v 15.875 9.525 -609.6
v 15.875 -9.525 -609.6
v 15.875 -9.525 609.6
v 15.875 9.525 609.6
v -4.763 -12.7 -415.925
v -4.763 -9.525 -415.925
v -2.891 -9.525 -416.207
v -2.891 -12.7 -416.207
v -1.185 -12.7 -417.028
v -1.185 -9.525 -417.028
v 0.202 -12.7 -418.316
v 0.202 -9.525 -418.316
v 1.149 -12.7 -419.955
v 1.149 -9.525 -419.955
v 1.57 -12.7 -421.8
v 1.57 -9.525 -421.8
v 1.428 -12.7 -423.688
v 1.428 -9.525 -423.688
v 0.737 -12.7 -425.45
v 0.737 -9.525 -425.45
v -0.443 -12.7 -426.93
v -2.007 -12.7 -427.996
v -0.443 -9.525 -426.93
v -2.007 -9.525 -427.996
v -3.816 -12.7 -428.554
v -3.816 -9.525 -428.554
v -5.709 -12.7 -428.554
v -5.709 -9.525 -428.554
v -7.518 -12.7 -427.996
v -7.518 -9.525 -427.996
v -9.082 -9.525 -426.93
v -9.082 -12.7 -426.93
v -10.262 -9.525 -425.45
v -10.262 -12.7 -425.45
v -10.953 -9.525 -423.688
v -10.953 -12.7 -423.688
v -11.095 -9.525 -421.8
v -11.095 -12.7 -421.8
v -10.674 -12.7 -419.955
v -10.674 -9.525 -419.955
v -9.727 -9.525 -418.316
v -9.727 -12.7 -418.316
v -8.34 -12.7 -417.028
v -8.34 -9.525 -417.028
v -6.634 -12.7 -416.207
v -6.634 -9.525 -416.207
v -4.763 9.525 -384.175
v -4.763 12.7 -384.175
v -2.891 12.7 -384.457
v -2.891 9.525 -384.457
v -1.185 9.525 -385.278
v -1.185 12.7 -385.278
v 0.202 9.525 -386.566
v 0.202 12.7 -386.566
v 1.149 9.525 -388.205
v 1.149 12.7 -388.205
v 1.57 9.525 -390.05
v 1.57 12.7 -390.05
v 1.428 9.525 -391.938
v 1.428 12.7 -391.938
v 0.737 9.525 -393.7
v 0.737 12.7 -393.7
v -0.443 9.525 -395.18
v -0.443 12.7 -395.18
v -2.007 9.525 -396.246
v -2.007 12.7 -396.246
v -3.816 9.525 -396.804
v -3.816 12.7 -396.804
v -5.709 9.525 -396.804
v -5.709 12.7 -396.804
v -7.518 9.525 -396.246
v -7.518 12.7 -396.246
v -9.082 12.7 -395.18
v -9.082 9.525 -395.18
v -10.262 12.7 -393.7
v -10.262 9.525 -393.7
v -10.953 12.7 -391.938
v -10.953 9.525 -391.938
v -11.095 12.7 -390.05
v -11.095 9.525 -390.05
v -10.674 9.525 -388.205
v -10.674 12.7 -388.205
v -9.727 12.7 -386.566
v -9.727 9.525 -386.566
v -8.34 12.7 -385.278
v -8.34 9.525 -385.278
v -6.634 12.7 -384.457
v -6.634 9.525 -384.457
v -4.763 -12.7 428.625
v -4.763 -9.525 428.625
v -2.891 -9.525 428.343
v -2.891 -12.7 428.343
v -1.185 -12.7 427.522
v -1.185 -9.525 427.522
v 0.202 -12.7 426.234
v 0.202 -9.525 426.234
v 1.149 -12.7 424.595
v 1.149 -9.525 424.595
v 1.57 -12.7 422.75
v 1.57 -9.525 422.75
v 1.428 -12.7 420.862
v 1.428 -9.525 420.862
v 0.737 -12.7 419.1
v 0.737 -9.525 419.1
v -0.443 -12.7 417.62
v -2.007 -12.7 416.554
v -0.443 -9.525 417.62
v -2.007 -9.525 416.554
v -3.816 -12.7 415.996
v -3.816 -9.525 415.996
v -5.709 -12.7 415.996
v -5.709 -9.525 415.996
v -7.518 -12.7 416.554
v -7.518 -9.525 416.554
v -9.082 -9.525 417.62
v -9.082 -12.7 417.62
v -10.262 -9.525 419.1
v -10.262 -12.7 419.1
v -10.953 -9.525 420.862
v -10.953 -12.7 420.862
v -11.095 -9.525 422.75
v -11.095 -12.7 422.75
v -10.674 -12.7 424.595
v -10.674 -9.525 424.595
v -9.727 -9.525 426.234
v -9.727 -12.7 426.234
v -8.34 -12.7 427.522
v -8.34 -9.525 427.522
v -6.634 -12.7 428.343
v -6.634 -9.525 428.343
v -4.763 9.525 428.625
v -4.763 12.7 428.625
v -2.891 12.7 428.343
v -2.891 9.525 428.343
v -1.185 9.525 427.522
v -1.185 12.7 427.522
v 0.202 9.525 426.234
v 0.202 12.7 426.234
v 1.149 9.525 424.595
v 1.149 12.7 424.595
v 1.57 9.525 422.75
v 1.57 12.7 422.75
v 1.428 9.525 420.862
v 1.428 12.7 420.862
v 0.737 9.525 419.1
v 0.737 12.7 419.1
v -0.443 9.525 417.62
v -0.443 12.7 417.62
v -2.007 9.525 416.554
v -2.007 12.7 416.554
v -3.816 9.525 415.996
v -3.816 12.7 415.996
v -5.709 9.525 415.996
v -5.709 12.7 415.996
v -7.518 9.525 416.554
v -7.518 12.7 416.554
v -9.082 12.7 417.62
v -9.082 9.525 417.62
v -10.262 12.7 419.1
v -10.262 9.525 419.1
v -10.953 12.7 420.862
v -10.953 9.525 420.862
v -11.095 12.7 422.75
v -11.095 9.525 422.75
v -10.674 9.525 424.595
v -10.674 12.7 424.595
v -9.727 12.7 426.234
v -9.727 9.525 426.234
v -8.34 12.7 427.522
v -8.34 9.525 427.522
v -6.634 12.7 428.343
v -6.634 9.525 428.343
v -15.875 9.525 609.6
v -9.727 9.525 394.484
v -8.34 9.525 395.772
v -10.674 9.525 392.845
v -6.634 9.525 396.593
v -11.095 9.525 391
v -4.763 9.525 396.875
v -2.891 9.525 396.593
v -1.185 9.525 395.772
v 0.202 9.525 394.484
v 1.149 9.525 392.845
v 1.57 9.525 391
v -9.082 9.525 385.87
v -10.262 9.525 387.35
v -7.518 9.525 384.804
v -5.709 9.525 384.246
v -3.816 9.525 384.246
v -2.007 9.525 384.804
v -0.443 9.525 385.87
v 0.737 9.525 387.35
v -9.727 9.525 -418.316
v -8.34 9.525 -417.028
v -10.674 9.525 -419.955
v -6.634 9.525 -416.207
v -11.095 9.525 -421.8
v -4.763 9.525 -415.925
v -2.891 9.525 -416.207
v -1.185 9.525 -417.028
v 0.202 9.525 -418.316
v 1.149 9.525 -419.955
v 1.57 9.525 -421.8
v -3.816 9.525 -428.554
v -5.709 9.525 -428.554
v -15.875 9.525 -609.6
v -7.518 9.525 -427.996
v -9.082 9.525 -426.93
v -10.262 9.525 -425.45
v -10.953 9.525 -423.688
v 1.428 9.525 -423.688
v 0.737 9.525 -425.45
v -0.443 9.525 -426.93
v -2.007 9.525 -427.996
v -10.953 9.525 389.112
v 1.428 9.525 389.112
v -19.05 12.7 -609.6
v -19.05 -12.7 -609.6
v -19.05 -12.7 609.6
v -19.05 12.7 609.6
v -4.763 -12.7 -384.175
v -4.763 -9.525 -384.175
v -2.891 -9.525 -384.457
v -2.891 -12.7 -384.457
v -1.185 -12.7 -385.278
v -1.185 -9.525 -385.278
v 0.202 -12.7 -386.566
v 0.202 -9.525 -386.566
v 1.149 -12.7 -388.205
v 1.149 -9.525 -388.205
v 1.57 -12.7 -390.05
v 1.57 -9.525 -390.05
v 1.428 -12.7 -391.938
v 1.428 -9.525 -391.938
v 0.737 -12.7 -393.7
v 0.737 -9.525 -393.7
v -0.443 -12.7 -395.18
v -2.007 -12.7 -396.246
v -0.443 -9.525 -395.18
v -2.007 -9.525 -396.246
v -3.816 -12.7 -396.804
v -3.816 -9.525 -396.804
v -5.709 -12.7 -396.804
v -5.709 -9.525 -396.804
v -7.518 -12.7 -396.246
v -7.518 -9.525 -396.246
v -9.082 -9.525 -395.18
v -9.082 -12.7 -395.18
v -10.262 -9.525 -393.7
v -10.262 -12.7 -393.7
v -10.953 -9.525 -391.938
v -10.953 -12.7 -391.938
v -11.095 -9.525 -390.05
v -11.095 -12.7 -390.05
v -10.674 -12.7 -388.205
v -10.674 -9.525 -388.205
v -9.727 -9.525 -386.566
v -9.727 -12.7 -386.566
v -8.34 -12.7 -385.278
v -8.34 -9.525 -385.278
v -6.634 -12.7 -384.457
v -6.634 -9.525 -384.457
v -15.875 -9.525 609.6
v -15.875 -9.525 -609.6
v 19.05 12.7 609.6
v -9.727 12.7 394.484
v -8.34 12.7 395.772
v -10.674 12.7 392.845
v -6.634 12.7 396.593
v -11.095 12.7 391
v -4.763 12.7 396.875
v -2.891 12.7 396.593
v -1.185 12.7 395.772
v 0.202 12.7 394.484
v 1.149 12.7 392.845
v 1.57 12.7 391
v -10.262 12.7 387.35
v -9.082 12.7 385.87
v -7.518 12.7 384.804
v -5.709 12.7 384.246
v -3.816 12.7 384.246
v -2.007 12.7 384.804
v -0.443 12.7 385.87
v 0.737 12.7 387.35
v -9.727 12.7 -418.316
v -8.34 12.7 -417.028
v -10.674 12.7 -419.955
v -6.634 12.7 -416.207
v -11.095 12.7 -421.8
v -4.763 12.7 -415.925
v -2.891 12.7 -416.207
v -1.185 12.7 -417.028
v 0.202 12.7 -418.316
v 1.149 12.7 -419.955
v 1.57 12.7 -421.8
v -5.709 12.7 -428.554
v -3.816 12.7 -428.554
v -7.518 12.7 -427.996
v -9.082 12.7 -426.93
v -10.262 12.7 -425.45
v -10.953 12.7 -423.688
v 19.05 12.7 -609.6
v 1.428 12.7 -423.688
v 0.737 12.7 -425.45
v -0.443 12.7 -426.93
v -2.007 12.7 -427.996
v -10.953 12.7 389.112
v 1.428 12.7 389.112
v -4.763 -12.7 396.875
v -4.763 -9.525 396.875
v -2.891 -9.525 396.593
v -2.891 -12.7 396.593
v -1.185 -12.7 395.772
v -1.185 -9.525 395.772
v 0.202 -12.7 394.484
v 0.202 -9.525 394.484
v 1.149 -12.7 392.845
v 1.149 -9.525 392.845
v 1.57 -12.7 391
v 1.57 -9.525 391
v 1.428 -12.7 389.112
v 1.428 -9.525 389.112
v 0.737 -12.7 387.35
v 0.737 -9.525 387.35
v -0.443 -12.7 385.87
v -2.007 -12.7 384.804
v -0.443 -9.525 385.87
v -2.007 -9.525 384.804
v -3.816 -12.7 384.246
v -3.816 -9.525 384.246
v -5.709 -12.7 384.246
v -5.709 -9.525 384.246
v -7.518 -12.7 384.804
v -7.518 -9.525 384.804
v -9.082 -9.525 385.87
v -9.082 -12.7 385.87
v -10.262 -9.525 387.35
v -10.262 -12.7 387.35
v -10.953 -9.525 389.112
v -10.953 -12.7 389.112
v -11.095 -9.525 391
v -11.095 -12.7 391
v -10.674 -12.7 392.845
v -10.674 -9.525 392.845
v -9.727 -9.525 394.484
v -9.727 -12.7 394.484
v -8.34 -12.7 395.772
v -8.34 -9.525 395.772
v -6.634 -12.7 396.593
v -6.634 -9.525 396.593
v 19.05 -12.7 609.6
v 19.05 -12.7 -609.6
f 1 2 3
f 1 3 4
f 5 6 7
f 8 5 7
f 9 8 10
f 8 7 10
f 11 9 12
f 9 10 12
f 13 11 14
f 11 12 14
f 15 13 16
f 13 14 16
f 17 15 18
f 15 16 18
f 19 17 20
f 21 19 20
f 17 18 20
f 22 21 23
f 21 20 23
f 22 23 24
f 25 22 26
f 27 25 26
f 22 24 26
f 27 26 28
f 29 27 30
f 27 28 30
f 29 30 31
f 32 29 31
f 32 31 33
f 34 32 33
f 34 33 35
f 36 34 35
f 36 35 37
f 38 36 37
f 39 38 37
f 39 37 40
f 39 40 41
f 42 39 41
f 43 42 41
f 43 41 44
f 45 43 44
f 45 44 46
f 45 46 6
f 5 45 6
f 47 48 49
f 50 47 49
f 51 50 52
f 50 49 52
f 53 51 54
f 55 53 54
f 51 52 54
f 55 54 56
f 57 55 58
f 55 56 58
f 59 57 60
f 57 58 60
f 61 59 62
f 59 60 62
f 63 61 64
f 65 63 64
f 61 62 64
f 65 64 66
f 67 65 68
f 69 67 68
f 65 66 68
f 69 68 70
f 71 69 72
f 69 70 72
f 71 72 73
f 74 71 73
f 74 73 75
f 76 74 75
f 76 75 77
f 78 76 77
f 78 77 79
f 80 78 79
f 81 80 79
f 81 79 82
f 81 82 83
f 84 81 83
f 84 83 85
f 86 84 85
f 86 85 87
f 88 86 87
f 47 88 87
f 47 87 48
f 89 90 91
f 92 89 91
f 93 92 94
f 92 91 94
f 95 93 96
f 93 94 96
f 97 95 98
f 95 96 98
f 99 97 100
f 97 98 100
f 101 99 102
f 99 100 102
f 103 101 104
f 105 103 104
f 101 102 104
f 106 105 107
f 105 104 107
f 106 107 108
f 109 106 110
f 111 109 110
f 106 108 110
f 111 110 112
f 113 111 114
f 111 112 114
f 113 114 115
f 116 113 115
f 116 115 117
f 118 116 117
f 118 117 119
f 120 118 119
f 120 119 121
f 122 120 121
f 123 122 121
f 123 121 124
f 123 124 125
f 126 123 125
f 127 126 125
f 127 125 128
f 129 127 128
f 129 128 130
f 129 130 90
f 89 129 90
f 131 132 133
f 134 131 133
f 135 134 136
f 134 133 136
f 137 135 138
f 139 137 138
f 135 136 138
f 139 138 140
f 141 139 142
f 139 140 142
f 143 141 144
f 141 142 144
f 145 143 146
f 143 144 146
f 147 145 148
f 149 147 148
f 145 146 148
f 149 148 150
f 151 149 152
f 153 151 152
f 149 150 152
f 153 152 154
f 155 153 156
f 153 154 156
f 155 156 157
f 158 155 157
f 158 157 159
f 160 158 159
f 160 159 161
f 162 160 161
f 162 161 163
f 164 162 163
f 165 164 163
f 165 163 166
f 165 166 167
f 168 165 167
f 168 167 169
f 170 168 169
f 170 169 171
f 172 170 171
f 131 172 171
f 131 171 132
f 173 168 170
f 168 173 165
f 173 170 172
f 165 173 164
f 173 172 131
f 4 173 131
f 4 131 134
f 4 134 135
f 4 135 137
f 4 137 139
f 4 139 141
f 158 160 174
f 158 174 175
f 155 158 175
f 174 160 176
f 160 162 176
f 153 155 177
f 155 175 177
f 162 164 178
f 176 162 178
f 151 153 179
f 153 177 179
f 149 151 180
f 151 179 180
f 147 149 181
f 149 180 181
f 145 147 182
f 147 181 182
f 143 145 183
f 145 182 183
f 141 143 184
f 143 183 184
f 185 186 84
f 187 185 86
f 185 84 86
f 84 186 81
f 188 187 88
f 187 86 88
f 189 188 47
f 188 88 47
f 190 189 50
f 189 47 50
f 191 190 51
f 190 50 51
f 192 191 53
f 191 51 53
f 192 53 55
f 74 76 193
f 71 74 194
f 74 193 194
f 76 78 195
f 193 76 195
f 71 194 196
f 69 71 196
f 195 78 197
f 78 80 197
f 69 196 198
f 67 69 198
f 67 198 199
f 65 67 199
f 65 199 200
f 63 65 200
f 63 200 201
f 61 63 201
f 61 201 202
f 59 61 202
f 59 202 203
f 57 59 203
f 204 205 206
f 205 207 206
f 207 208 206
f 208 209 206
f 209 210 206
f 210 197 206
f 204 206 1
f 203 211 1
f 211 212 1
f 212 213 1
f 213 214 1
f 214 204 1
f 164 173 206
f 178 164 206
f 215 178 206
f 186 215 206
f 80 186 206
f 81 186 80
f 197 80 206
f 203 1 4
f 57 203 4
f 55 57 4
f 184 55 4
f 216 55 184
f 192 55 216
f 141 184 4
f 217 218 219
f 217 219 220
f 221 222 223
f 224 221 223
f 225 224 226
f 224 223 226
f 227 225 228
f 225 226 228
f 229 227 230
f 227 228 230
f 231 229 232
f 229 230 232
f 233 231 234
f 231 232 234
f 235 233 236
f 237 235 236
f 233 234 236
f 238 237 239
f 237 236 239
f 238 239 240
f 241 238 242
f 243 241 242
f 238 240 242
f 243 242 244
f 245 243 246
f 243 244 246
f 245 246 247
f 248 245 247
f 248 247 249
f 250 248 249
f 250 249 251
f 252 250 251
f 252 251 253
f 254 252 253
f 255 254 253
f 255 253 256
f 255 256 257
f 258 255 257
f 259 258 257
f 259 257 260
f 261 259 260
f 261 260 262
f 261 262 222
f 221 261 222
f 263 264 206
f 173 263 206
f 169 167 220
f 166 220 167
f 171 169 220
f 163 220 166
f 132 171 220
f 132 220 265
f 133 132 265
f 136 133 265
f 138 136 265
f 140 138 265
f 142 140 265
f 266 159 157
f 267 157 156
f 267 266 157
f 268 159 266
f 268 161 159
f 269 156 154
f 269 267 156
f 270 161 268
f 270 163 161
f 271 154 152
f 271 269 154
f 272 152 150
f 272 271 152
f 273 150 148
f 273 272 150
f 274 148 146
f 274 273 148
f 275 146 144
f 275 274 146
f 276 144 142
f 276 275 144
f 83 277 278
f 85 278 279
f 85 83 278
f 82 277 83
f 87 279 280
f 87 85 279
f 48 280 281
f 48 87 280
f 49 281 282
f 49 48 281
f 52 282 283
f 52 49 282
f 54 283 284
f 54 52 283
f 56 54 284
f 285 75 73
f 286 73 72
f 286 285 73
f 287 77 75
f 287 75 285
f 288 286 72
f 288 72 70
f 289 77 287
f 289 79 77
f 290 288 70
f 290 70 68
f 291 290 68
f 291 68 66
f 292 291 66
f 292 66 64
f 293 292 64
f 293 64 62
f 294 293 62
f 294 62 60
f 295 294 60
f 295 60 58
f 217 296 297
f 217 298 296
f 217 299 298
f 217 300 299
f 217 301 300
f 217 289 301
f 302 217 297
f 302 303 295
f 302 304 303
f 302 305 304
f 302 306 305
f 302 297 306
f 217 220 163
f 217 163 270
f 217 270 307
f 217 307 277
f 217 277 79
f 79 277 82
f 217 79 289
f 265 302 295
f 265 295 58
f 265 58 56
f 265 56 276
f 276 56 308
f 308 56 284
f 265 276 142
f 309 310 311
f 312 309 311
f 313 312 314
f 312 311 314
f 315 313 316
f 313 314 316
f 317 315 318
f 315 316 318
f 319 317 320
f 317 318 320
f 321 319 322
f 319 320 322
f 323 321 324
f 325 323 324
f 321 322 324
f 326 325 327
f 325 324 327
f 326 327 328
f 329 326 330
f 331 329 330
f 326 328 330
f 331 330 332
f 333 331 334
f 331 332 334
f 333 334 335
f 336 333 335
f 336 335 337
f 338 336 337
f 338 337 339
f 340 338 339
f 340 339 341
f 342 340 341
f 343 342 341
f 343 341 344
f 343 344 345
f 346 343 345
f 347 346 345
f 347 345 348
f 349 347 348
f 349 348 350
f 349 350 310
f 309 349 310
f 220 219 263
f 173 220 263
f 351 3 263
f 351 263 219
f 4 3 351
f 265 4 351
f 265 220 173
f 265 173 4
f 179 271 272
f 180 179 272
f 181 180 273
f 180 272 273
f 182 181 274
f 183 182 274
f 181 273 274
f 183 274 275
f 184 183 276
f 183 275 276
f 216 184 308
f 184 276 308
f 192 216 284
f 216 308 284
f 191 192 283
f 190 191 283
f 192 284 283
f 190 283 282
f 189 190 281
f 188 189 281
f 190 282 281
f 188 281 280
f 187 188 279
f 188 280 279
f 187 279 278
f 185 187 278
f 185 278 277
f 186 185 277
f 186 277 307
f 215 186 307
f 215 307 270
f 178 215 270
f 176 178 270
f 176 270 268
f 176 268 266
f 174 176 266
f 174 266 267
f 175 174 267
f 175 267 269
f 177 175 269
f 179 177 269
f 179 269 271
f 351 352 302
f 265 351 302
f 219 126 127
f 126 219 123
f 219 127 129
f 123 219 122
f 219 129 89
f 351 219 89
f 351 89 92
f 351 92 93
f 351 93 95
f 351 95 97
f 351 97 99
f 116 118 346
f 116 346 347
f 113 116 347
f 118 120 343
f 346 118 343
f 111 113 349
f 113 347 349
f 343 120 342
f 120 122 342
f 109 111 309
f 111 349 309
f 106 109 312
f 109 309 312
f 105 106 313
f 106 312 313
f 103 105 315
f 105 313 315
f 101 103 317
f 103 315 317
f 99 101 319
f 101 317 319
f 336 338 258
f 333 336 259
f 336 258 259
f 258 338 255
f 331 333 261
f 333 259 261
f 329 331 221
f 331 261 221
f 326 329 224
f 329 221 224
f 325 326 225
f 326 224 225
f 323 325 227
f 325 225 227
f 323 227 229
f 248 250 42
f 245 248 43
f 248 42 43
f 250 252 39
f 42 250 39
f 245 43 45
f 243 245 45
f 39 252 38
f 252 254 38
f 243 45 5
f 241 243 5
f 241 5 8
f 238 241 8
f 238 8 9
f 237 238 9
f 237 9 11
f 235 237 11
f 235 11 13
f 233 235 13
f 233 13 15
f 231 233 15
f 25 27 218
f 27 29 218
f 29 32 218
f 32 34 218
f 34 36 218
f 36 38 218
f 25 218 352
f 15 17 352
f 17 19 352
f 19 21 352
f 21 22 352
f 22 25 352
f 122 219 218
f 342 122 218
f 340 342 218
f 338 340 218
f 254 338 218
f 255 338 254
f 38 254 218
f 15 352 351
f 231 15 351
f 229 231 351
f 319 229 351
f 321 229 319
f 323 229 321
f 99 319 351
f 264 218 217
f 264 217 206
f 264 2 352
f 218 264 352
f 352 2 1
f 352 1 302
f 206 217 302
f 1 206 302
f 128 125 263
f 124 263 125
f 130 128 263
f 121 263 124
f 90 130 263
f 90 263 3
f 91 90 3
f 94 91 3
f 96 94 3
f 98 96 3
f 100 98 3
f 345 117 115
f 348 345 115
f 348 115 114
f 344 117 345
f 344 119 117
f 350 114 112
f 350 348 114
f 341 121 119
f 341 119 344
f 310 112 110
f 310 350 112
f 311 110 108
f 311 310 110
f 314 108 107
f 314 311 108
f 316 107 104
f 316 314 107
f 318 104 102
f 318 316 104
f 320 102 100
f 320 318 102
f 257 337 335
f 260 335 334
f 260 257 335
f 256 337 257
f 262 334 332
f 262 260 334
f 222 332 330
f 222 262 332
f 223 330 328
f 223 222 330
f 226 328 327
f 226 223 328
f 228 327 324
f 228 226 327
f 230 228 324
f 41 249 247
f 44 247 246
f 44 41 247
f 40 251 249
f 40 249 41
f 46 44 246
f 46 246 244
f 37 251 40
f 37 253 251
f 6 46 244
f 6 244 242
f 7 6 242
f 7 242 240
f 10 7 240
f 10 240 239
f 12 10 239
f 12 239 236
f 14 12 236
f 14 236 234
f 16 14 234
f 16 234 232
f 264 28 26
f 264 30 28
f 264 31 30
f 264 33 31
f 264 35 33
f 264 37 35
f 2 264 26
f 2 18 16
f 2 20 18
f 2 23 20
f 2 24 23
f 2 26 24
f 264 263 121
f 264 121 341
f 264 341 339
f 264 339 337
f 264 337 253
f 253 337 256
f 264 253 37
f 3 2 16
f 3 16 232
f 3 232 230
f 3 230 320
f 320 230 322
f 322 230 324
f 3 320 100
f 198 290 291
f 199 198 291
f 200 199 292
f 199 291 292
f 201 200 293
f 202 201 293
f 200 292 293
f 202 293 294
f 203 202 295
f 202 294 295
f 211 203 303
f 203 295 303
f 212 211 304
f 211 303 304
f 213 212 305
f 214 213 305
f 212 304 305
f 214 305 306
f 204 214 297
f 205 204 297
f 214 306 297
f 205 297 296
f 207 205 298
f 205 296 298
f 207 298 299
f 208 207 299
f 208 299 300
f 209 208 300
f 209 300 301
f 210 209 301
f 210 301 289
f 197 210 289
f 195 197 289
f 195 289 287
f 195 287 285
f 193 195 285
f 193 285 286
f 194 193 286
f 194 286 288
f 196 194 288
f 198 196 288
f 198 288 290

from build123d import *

# Parameters (mm, degrees)
BOSS_EXTRUDE1_DEPTH      = 609.6
BOSS_EXTRUDE1_DEPTH_BACK = 609.6
SKETCH3_W                = 38.1
SKETCH3_H                = 25.4
SKETCH3_W_2              = 31.75
SKETCH3_H_2              = 19.05
SKETCH6_R                = 6.35
CUT_EXTRUDE1_DEPTH       = 611.426262951


with BuildPart() as part:
    # Sketch3 → Boss-Extrude1 (new, two sides: drawn at the far end of the back side and taken through both)
    with BuildSketch(Plane.XY.offset(-BOSS_EXTRUDE1_DEPTH_BACK)):
        Rectangle(SKETCH3_W, SKETCH3_H)
        Rectangle(SKETCH3_W_2, SKETCH3_H_2, mode=Mode.SUBTRACT)
    extrude(amount=BOSS_EXTRUDE1_DEPTH + BOSS_EXTRUDE1_DEPTH_BACK)

    # Sketch6 → Cut-Extrude1 (cut, through all)
    with BuildSketch(Plane(origin=(0, 12.7, 0), x_dir=(1, 0, 0), z_dir=(0, 1, 0))):
        with Locations(Location((-4.7625, -390.525, 0), (0, 0, 270))):
            Circle(SKETCH6_R)
        with Locations(Location((-4.7625, -422.275, 0), (0, 0, 270))):
            Circle(SKETCH6_R)
        with Locations(Location((-4.7625, 422.275, 0), (0, 0, 270))):
            Circle(SKETCH6_R)
        with Locations(Location((-4.7625, 390.525, 0), (0, 0, 270))):
            Circle(SKETCH6_R)
    extrude(amount=-CUT_EXTRUDE1_DEPTH, mode=Mode.SUBTRACT)


solid = part.part
